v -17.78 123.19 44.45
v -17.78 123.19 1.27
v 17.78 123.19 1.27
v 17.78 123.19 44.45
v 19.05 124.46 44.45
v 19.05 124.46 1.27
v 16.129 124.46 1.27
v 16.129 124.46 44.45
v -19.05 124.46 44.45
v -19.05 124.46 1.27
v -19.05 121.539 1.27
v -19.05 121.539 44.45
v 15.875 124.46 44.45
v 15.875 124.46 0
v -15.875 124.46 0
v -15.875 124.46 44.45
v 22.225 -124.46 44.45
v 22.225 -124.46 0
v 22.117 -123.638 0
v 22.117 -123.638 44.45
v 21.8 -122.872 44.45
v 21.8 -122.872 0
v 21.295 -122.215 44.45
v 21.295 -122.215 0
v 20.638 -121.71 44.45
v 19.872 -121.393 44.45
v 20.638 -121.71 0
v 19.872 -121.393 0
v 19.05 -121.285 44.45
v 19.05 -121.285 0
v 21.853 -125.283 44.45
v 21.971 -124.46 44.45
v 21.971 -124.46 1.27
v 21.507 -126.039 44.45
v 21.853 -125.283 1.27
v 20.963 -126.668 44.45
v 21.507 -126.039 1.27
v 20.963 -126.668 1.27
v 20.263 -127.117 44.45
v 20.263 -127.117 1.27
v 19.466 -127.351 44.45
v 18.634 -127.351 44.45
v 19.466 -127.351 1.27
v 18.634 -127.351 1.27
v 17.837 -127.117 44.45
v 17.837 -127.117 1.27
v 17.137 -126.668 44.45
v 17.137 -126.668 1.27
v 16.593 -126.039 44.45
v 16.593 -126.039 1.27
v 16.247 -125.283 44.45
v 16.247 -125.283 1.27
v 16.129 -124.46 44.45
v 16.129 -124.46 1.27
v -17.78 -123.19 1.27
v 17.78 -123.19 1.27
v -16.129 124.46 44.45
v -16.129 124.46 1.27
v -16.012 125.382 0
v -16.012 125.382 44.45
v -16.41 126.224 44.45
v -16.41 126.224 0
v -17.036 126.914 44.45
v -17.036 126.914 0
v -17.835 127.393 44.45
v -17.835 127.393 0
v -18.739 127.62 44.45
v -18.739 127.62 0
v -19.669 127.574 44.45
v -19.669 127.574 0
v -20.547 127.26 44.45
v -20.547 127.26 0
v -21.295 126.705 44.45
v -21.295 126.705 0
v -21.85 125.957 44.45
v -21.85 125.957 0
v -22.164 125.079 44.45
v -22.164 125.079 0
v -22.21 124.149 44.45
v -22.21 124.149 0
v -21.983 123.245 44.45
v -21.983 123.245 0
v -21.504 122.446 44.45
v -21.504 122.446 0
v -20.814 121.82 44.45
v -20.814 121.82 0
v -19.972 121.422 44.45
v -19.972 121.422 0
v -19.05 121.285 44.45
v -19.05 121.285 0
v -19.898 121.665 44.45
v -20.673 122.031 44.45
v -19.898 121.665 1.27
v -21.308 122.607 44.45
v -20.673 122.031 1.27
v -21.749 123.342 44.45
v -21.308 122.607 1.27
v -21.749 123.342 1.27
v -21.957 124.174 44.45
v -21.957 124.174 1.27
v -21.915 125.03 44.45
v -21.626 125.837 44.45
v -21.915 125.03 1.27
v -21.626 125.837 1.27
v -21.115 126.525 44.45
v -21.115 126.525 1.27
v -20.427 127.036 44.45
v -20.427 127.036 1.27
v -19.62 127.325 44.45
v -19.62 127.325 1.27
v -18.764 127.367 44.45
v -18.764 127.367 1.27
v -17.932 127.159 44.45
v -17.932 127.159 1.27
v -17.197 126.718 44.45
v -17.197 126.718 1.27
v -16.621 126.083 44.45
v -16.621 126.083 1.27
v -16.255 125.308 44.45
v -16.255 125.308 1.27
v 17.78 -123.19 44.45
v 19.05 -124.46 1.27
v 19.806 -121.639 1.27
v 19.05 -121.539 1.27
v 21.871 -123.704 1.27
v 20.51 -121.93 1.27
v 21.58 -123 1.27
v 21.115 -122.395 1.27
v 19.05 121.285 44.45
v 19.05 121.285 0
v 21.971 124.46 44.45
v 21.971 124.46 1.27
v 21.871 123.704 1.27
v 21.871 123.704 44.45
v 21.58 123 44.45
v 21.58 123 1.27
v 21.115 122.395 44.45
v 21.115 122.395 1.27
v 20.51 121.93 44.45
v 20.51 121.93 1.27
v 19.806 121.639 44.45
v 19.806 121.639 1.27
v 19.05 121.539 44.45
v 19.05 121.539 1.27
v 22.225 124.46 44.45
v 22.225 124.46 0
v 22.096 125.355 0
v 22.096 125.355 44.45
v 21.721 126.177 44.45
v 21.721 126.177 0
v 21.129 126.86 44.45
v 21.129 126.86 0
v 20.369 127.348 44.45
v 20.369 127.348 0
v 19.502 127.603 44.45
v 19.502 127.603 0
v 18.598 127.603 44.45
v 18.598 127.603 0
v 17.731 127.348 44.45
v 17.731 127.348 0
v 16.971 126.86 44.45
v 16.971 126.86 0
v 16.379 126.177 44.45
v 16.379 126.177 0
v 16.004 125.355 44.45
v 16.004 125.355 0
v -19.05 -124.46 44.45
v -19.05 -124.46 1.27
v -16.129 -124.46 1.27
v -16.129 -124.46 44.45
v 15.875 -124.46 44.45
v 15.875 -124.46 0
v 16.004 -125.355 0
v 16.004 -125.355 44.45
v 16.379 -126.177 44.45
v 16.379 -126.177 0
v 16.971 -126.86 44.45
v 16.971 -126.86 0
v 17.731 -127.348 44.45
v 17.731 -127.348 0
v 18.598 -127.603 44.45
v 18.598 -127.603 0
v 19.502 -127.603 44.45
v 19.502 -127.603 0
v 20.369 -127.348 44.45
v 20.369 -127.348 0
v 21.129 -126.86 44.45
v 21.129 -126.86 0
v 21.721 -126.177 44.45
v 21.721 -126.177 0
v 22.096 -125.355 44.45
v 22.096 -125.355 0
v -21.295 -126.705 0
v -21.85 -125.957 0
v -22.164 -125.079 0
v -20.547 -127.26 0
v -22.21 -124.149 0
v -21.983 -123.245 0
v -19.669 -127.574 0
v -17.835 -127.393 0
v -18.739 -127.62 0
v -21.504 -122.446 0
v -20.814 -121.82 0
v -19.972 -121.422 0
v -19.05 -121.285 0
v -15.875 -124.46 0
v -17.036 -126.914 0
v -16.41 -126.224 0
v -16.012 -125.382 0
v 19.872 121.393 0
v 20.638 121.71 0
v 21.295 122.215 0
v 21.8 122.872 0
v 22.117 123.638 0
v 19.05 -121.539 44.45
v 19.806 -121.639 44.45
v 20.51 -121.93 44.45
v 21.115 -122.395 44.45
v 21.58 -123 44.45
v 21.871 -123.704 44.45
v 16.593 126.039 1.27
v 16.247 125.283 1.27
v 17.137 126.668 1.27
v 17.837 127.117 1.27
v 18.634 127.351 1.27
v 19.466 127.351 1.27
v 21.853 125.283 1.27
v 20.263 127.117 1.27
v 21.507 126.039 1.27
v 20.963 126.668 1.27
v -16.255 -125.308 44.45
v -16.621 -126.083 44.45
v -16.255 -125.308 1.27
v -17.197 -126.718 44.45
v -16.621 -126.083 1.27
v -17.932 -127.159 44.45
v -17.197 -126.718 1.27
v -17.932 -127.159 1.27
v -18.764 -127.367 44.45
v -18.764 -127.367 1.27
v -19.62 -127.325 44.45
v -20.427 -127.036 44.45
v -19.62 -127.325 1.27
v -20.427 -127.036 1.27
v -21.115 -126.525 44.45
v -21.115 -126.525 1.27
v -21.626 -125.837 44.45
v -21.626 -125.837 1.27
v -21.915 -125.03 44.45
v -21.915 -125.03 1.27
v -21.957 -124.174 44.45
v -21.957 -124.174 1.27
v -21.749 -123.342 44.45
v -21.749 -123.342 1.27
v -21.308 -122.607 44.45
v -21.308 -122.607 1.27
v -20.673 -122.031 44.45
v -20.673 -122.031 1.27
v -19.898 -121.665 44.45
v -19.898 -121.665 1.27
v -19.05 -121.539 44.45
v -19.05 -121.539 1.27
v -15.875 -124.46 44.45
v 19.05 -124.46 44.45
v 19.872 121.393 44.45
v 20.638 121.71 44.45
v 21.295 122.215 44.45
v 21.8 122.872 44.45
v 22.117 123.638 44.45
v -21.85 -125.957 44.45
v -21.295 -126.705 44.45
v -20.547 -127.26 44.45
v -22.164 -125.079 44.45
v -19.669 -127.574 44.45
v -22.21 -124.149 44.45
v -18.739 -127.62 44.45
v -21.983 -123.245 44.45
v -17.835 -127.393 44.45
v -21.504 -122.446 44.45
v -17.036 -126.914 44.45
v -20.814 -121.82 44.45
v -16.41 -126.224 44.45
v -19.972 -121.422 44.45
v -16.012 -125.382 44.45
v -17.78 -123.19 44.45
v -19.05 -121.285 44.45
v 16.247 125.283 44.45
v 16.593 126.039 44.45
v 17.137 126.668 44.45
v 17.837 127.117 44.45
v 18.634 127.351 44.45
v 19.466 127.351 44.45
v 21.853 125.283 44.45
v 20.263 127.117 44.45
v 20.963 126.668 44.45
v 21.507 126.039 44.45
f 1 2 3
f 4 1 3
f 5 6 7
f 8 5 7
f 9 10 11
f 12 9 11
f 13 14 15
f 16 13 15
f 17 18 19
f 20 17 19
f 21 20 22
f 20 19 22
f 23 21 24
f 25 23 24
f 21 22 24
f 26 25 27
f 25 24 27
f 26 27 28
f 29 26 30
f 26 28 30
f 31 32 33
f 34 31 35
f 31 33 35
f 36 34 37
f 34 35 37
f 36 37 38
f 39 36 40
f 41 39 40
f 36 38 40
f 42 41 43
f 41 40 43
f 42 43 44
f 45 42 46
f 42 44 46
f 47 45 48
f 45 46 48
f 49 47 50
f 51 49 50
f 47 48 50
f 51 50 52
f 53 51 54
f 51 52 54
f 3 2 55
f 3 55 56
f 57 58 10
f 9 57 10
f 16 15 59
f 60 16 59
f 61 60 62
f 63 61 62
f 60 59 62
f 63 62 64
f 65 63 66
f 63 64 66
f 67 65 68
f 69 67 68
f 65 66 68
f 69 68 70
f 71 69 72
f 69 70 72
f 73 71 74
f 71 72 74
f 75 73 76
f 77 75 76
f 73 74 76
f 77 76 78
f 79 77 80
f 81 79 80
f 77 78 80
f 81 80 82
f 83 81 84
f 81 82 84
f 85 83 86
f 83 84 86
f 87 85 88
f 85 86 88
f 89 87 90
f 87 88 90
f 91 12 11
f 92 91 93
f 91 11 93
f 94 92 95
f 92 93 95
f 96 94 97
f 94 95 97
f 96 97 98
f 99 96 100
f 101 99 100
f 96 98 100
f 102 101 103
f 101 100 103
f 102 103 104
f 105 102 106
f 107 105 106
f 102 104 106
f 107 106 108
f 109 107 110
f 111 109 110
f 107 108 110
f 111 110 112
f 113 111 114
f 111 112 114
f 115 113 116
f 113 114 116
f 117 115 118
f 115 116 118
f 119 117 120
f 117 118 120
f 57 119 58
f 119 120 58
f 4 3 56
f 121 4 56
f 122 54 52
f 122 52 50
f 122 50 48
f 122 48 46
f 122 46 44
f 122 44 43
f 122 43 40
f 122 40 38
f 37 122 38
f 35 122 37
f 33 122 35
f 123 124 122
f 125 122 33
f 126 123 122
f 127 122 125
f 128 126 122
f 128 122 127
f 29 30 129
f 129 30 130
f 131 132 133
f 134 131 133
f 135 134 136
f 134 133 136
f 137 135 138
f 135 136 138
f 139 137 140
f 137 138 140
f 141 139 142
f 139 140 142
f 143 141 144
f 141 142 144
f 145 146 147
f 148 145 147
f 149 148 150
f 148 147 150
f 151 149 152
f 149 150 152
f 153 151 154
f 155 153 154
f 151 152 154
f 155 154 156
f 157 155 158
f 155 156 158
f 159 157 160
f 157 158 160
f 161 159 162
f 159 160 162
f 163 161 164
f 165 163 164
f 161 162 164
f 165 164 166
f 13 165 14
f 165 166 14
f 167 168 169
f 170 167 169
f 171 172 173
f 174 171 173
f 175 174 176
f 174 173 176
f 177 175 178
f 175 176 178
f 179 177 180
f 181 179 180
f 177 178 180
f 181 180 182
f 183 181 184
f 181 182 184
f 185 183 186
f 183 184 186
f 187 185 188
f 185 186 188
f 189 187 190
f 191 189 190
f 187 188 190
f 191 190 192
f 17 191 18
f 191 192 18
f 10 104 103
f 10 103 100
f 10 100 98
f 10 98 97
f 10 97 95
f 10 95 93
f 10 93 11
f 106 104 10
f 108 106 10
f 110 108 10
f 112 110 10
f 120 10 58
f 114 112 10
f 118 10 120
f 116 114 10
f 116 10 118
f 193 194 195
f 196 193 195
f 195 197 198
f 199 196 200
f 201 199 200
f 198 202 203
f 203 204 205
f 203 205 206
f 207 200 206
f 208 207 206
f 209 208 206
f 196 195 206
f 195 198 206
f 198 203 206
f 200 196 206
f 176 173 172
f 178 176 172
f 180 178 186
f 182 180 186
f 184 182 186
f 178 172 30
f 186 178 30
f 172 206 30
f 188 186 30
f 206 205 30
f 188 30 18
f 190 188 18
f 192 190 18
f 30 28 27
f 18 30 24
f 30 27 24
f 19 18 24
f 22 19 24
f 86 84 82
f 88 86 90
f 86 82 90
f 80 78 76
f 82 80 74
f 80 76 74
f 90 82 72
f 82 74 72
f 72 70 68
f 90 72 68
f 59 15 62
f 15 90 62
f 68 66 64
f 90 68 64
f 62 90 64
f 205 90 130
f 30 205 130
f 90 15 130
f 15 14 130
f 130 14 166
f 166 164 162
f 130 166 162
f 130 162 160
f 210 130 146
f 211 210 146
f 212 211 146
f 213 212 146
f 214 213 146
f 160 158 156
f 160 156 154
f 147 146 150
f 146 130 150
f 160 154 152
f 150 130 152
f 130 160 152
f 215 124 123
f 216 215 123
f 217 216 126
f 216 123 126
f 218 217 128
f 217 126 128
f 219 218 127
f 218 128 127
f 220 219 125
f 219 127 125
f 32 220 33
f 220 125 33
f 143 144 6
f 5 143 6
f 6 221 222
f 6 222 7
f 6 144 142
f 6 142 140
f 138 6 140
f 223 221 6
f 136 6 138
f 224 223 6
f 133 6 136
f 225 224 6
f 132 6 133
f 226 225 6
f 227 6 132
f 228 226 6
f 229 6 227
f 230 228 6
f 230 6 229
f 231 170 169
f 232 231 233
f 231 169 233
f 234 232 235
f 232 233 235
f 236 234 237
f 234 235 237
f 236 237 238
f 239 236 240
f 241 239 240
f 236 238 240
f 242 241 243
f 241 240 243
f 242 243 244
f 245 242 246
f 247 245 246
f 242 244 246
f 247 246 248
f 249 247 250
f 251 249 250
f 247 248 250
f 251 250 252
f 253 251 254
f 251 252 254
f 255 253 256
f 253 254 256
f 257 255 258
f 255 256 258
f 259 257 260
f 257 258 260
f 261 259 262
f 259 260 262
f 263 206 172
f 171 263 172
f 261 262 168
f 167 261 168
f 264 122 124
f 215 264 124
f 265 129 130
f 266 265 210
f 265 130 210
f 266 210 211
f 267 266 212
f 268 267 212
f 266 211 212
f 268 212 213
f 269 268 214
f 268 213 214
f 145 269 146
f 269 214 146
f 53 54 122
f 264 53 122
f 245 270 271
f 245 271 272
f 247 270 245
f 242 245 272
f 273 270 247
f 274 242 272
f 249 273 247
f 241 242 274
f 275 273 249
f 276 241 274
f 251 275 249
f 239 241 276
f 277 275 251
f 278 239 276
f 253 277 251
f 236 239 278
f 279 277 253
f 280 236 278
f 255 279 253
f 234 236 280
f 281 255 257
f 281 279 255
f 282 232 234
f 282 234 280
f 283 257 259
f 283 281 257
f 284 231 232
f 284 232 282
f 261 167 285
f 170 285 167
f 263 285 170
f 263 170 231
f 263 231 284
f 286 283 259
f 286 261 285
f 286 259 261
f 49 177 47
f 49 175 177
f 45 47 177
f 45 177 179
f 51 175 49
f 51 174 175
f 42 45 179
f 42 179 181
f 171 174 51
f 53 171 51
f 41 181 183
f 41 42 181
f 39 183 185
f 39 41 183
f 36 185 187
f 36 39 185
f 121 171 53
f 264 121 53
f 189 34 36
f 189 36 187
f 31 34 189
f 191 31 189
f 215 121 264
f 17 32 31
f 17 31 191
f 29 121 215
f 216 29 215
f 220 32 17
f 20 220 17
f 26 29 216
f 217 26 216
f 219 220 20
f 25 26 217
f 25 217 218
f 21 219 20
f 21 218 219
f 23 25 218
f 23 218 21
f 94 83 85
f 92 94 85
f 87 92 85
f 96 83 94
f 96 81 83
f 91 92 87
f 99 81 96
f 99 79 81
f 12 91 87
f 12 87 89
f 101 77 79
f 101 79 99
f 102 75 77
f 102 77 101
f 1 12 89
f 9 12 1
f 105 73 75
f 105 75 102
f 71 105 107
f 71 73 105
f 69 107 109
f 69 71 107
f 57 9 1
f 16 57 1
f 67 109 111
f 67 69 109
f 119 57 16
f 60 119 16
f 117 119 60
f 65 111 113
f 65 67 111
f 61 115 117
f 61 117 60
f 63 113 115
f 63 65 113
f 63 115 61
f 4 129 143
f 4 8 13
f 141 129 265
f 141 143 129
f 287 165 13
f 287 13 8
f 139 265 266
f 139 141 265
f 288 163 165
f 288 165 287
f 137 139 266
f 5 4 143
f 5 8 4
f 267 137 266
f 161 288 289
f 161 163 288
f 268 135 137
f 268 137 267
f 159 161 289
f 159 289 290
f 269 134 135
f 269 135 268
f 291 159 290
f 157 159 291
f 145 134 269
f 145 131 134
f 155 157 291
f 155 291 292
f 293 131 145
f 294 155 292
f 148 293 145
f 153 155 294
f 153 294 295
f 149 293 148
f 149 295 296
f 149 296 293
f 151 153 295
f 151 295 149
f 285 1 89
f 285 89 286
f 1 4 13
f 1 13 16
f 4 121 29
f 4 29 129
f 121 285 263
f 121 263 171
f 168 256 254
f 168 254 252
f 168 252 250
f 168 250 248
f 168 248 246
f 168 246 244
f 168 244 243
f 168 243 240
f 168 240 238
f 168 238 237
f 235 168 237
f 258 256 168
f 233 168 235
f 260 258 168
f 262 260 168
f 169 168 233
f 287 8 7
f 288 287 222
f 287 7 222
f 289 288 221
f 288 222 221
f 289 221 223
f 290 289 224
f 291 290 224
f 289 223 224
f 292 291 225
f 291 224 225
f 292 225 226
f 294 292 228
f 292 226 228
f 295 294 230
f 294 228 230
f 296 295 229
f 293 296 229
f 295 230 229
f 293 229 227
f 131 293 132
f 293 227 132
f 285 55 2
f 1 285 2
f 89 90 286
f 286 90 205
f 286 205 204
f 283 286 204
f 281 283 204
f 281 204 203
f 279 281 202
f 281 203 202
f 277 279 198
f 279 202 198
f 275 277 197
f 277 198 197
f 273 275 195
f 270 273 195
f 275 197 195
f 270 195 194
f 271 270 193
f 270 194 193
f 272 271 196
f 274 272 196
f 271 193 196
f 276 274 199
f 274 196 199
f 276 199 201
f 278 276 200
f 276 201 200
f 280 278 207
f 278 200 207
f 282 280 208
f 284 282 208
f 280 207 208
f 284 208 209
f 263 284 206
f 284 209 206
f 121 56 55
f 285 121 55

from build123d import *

# Parameters (mm, degrees)
F1_DEPTH = 44.45
F2_DEPTH = 1.27


with BuildPart() as f1:
    # F0 (on Top) → F1 (new body)
    with BuildSketch(Plane.XY):
        with BuildLine():
            Line((-16.129, 124.46), (-19.05, 124.46))
            Line((-19.05, 124.46), (-19.05, 121.539))
            ThreePointArc((-19.05, 121.539), (-18.3985955267, 121.6125602355), (-17.78, 121.8295359725))
            Line((-17.78, 121.8295359725), (-17.78, 123.19))
            Line((-17.78, 123.19), (-16.4195359725, 123.19))
            ThreePointArc((-16.4195359725, 123.19), (-16.2025602355, 123.8085955267), (-16.129, 124.46))
        make_face()
        with BuildLine():
            Line((-15.875, 124.46), (-16.129, 124.46))
            ThreePointArc((-16.129, 124.46), (-16.2025602355, 123.8085955267), (-16.4195359725, 123.19))
            Line((-16.4195359725, 123.19), (-16.1400644337, 123.19))
            ThreePointArc((-16.1400644337, 123.19), (-15.9419724564, 123.8113168813), (-15.875, 124.46))
        make_face()
        with BuildLine():
            Line((15.875, 124.46), (-15.875, 124.46))
            ThreePointArc((-15.875, 124.46), (-15.9419724564, 123.8113168813), (-16.1400644337, 123.19))
            Line((-16.1400644337, 123.19), (16.1400644337, 123.19))
            ThreePointArc((16.1400644337, 123.19), (15.9419724564, 123.8113168813), (15.875, 124.46))
        make_face()
        with BuildLine():
            Line((16.129, 124.46), (15.875, 124.46))
            ThreePointArc((15.875, 124.46), (15.9419724564, 123.8113168813), (16.1400644337, 123.19))
            Line((16.1400644337, 123.19), (16.4195359725, 123.19))
            ThreePointArc((16.4195359725, 123.19), (16.2025602355, 123.8085955267), (16.129, 124.46))
        make_face()
        with BuildLine():
            Line((19.05, 124.46), (16.129, 124.46))
            ThreePointArc((16.129, 124.46), (16.2025602355, 123.8085955267), (16.4195359725, 123.19))
            Line((16.4195359725, 123.19), (17.78, 123.19))
            Line((17.78, 123.19), (17.78, 121.8295359725))
            ThreePointArc((17.78, 121.8295359725), (18.3985955267, 121.6125602355), (19.05, 121.539))
            Line((19.05, 121.539), (19.05, 124.46))
        make_face()
        with BuildLine():
            ThreePointArc((22.225, 124.46), (19.05, 127.635), (15.875, 124.46))
            Line((15.875, 124.46), (16.129, 124.46))
            ThreePointArc((16.129, 124.46), (19.05, 127.381), (21.971, 124.46))
            ThreePointArc((21.971, 124.46), (21.1154589078, 122.3945410922), (19.05, 121.539))
            Line((19.05, 121.539), (19.05, 121.285))
            ThreePointArc((19.05, 121.285), (21.2950640303, 122.2149359697), (22.225, 124.46))
        make_face()
        with BuildLine():
            ThreePointArc((-19.05, 121.539), (-21.1154589078, 126.5254589078), (-16.129, 124.46))
            Line((-16.129, 124.46), (-15.875, 124.46))
            ThreePointArc((-15.875, 124.46), (-21.2950640303, 126.7050640303), (-19.05, 121.285))
            Line((-19.05, 121.285), (-19.05, 121.539))
        make_face()
        with BuildLine():
            ThreePointArc((-17.78, -121.8295359725), (-18.3985955267, -121.6125602355), (-19.05, -121.539))
            Line((-19.05, -121.539), (-19.05, -124.46))
            Line((-19.05, -124.46), (-16.129, -124.46))
            ThreePointArc((-16.129, -124.46), (-16.2025602355, -123.8085955267), (-16.4195359725, -123.19))
            Line((-16.4195359725, -123.19), (-17.78, -123.19))
            Line((-17.78, -123.19), (-17.78, -121.8295359725))
        make_face()
        with BuildLine():
            Line((-19.05, -121.539), (-19.05, -121.285))
            ThreePointArc((-19.05, -121.285), (-21.2950640303, -126.7050640303), (-15.875, -124.46))
            Line((-15.875, -124.46), (-16.129, -124.46))
            ThreePointArc((-16.129, -124.46), (-21.1154589078, -126.5254589078), (-19.05, -121.539))
        make_face()
        with BuildLine():
            ThreePointArc((16.4195359725, -123.19), (16.2025602355, -123.8085955267), (16.129, -124.46))
            Line((16.129, -124.46), (19.05, -124.46))
            Line((19.05, -124.46), (19.05, -121.539))
            ThreePointArc((19.05, -121.539), (18.3985955267, -121.6125602355), (17.78, -121.8295359725))
            Line((17.78, -121.8295359725), (17.78, -123.19))
            Line((17.78, -123.19), (16.4195359725, -123.19))
        make_face()
        with BuildLine():
            Line((16.129, -124.46), (15.875, -124.46))
            ThreePointArc((15.875, -124.46), (19.05, -127.635), (22.225, -124.46))
            ThreePointArc((22.225, -124.46), (21.2950640303, -122.2149359697), (19.05, -121.285))
            Line((19.05, -121.285), (19.05, -121.539))
            ThreePointArc((19.05, -121.539), (21.1154589078, -122.3945410922), (21.971, -124.46))
            ThreePointArc((21.971, -124.46), (19.05, -127.381), (16.129, -124.46))
        make_face()
        with BuildLine():
            ThreePointArc((16.1400644337, -123.19), (15.9419724564, -123.8113168813), (15.875, -124.46))
            Line((15.875, -124.46), (16.129, -124.46))
            ThreePointArc((16.129, -124.46), (16.2025602355, -123.8085955267), (16.4195359725, -123.19))
            Line((16.4195359725, -123.19), (16.1400644337, -123.19))
        make_face()
        with BuildLine():
            ThreePointArc((-17.78, 121.5500644337), (-18.4013168813, 121.3519724564), (-19.05, 121.285))
            Line((-19.05, 121.285), (-19.05, -121.285))
            ThreePointArc((-19.05, -121.285), (-18.4013168813, -121.3519724564), (-17.78, -121.5500644337))
            Line((-17.78, -121.5500644337), (-17.78, 121.5500644337))
        make_face()
        with BuildLine():
            Line((19.05, -121.285), (19.05, 121.285))
            ThreePointArc((19.05, 121.285), (18.4013168813, 121.3519724564), (17.78, 121.5500644337))
            Line((17.78, 121.5500644337), (17.78, -121.5500644337))
            ThreePointArc((17.78, -121.5500644337), (18.4013168813, -121.3519724564), (19.05, -121.285))
        make_face()
        with BuildLine():
            ThreePointArc((-16.1400644337, -123.19), (-15.9419724564, -123.8113168813), (-15.875, -124.46))
            Line((-15.875, -124.46), (15.875, -124.46))
            ThreePointArc((15.875, -124.46), (15.9419724564, -123.8113168813), (16.1400644337, -123.19))
            Line((16.1400644337, -123.19), (-16.1400644337, -123.19))
        make_face()
        with BuildLine():
            Line((19.05, -121.539), (19.05, -121.285))
            ThreePointArc((19.05, -121.285), (18.4013168813, -121.3519724564), (17.78, -121.5500644337))
            Line((17.78, -121.5500644337), (17.78, -121.8295359725))
            ThreePointArc((17.78, -121.8295359725), (18.3985955267, -121.6125602355), (19.05, -121.539))
        make_face()
        with BuildLine():
            Line((-16.129, -124.46), (-15.875, -124.46))
            ThreePointArc((-15.875, -124.46), (-15.9419724564, -123.8113168813), (-16.1400644337, -123.19))
            Line((-16.1400644337, -123.19), (-16.4195359725, -123.19))
            ThreePointArc((-16.4195359725, -123.19), (-16.2025602355, -123.8085955267), (-16.129, -124.46))
        make_face()
        with BuildLine():
            ThreePointArc((-17.78, -121.5500644337), (-18.4013168813, -121.3519724564), (-19.05, -121.285))
            Line((-19.05, -121.285), (-19.05, -121.539))
            ThreePointArc((-19.05, -121.539), (-18.3985955267, -121.6125602355), (-17.78, -121.8295359725))
            Line((-17.78, -121.8295359725), (-17.78, -121.5500644337))
        make_face()
        with BuildLine():
            ThreePointArc((17.78, 121.5500644337), (18.4013168813, 121.3519724564), (19.05, 121.285))
            Line((19.05, 121.285), (19.05, 121.539))
            ThreePointArc((19.05, 121.539), (18.3985955267, 121.6125602355), (17.78, 121.8295359725))
            Line((17.78, 121.8295359725), (17.78, 121.5500644337))
        make_face()
        with BuildLine():
            ThreePointArc((-17.78, 121.8295359725), (-18.3985955267, 121.6125602355), (-19.05, 121.539))
            Line((-19.05, 121.539), (-19.05, 121.285))
            ThreePointArc((-19.05, 121.285), (-18.4013168813, 121.3519724564), (-17.78, 121.5500644337))
            Line((-17.78, 121.5500644337), (-17.78, 121.8295359725))
        make_face()
    extrude(amount=F1_DEPTH)

    # F0 (on Top) → F2 (join)
    with BuildSketch(Plane.XY):
        with BuildLine():
            Line((16.1400644337, 123.19), (-16.1400644337, 123.19))
            ThreePointArc((-16.1400644337, 123.19), (-16.8049359697, 122.2149359697), (-17.78, 121.5500644337))
            Line((-17.78, 121.5500644337), (-17.78, -121.5500644337))
            ThreePointArc((-17.78, -121.5500644337), (-16.8049359697, -122.2149359697), (-16.1400644337, -123.19))
            Line((-16.1400644337, -123.19), (16.1400644337, -123.19))
            ThreePointArc((16.1400644337, -123.19), (16.8049359697, -122.2149359697), (17.78, -121.5500644337))
            Line((17.78, -121.5500644337), (17.78, 121.5500644337))
            ThreePointArc((17.78, 121.5500644337), (16.8049359697, 122.2149359697), (16.1400644337, 123.19))
        make_face()
        with BuildLine():
            ThreePointArc((-17.78, 121.8295359725), (-16.9845410922, 122.3945410922), (-16.4195359725, 123.19))
            Line((-16.4195359725, 123.19), (-17.78, 123.19))
            Line((-17.78, 123.19), (-17.78, 121.8295359725))
        make_face()
        with BuildLine():
            Line((-16.1400644337, 123.19), (-16.4195359725, 123.19))
            ThreePointArc((-16.4195359725, 123.19), (-16.9845410922, 122.3945410922), (-17.78, 121.8295359725))
            Line((-17.78, 121.8295359725), (-17.78, 121.5500644337))
            ThreePointArc((-17.78, 121.5500644337), (-16.8049359697, 122.2149359697), (-16.1400644337, 123.19))
        make_face()
        with BuildLine():
            Line((17.78, 123.19), (16.4195359725, 123.19))
            ThreePointArc((16.4195359725, 123.19), (16.9845410922, 122.3945410922), (17.78, 121.8295359725))
            Line((17.78, 121.8295359725), (17.78, 123.19))
        make_face()
        with BuildLine():
            Line((16.4195359725, 123.19), (16.1400644337, 123.19))
            ThreePointArc((16.1400644337, 123.19), (16.8049359697, 122.2149359697), (17.78, 121.5500644337))
            Line((17.78, 121.5500644337), (17.78, 121.8295359725))
            ThreePointArc((17.78, 121.8295359725), (16.9845410922, 122.3945410922), (16.4195359725, 123.19))
        make_face()
        with BuildLine():
            Line((17.78, -123.19), (17.78, -121.8295359725))
            ThreePointArc((17.78, -121.8295359725), (16.9845410922, -122.3945410922), (16.4195359725, -123.19))
            Line((16.4195359725, -123.19), (17.78, -123.19))
        make_face()
        with BuildLine():
            Line((17.78, -121.8295359725), (17.78, -121.5500644337))
            ThreePointArc((17.78, -121.5500644337), (16.8049359697, -122.2149359697), (16.1400644337, -123.19))
            Line((16.1400644337, -123.19), (16.4195359725, -123.19))
            ThreePointArc((16.4195359725, -123.19), (16.9845410922, -122.3945410922), (17.78, -121.8295359725))
        make_face()
        with BuildLine():
            ThreePointArc((-16.1400644337, -123.19), (-16.8049359697, -122.2149359697), (-17.78, -121.5500644337))
            Line((-17.78, -121.5500644337), (-17.78, -121.8295359725))
            ThreePointArc((-17.78, -121.8295359725), (-16.9845410922, -122.3945410922), (-16.4195359725, -123.19))
            Line((-16.4195359725, -123.19), (-16.1400644337, -123.19))
        make_face()
        with BuildLine():
            ThreePointArc((-16.4195359725, -123.19), (-16.9845410922, -122.3945410922), (-17.78, -121.8295359725))
            Line((-17.78, -121.8295359725), (-17.78, -123.19))
            Line((-17.78, -123.19), (-16.4195359725, -123.19))
        make_face()
        with BuildLine():
            Line((19.05, -124.46), (16.129, -124.46))
            ThreePointArc((16.129, -124.46), (19.05, -127.381), (21.971, -124.46))
            ThreePointArc((21.971, -124.46), (21.1154589078, -122.3945410922), (19.05, -121.539))
            Line((19.05, -121.539), (19.05, -124.46))
        make_face()
        with BuildLine():
            Line((-19.05, -124.46), (-19.05, -121.539))
            ThreePointArc((-19.05, -121.539), (-21.1154589078, -126.5254589078), (-16.129, -124.46))
            Line((-16.129, -124.46), (-19.05, -124.46))
        make_face()
        with BuildLine():
            ThreePointArc((21.971, 124.46), (19.05, 127.381), (16.129, 124.46))
            Line((16.129, 124.46), (19.05, 124.46))
            Line((19.05, 124.46), (19.05, 121.539))
            ThreePointArc((19.05, 121.539), (21.1154589078, 122.3945410922), (21.971, 124.46))
        make_face()
        with BuildLine():
            Line((-19.05, 121.539), (-19.05, 124.46))
            Line((-19.05, 124.46), (-16.129, 124.46))
            ThreePointArc((-16.129, 124.46), (-21.1154589078, 126.5254589078), (-19.05, 121.539))
        make_face()
    extrude(amount=F2_DEPTH)


solid = f1.part
